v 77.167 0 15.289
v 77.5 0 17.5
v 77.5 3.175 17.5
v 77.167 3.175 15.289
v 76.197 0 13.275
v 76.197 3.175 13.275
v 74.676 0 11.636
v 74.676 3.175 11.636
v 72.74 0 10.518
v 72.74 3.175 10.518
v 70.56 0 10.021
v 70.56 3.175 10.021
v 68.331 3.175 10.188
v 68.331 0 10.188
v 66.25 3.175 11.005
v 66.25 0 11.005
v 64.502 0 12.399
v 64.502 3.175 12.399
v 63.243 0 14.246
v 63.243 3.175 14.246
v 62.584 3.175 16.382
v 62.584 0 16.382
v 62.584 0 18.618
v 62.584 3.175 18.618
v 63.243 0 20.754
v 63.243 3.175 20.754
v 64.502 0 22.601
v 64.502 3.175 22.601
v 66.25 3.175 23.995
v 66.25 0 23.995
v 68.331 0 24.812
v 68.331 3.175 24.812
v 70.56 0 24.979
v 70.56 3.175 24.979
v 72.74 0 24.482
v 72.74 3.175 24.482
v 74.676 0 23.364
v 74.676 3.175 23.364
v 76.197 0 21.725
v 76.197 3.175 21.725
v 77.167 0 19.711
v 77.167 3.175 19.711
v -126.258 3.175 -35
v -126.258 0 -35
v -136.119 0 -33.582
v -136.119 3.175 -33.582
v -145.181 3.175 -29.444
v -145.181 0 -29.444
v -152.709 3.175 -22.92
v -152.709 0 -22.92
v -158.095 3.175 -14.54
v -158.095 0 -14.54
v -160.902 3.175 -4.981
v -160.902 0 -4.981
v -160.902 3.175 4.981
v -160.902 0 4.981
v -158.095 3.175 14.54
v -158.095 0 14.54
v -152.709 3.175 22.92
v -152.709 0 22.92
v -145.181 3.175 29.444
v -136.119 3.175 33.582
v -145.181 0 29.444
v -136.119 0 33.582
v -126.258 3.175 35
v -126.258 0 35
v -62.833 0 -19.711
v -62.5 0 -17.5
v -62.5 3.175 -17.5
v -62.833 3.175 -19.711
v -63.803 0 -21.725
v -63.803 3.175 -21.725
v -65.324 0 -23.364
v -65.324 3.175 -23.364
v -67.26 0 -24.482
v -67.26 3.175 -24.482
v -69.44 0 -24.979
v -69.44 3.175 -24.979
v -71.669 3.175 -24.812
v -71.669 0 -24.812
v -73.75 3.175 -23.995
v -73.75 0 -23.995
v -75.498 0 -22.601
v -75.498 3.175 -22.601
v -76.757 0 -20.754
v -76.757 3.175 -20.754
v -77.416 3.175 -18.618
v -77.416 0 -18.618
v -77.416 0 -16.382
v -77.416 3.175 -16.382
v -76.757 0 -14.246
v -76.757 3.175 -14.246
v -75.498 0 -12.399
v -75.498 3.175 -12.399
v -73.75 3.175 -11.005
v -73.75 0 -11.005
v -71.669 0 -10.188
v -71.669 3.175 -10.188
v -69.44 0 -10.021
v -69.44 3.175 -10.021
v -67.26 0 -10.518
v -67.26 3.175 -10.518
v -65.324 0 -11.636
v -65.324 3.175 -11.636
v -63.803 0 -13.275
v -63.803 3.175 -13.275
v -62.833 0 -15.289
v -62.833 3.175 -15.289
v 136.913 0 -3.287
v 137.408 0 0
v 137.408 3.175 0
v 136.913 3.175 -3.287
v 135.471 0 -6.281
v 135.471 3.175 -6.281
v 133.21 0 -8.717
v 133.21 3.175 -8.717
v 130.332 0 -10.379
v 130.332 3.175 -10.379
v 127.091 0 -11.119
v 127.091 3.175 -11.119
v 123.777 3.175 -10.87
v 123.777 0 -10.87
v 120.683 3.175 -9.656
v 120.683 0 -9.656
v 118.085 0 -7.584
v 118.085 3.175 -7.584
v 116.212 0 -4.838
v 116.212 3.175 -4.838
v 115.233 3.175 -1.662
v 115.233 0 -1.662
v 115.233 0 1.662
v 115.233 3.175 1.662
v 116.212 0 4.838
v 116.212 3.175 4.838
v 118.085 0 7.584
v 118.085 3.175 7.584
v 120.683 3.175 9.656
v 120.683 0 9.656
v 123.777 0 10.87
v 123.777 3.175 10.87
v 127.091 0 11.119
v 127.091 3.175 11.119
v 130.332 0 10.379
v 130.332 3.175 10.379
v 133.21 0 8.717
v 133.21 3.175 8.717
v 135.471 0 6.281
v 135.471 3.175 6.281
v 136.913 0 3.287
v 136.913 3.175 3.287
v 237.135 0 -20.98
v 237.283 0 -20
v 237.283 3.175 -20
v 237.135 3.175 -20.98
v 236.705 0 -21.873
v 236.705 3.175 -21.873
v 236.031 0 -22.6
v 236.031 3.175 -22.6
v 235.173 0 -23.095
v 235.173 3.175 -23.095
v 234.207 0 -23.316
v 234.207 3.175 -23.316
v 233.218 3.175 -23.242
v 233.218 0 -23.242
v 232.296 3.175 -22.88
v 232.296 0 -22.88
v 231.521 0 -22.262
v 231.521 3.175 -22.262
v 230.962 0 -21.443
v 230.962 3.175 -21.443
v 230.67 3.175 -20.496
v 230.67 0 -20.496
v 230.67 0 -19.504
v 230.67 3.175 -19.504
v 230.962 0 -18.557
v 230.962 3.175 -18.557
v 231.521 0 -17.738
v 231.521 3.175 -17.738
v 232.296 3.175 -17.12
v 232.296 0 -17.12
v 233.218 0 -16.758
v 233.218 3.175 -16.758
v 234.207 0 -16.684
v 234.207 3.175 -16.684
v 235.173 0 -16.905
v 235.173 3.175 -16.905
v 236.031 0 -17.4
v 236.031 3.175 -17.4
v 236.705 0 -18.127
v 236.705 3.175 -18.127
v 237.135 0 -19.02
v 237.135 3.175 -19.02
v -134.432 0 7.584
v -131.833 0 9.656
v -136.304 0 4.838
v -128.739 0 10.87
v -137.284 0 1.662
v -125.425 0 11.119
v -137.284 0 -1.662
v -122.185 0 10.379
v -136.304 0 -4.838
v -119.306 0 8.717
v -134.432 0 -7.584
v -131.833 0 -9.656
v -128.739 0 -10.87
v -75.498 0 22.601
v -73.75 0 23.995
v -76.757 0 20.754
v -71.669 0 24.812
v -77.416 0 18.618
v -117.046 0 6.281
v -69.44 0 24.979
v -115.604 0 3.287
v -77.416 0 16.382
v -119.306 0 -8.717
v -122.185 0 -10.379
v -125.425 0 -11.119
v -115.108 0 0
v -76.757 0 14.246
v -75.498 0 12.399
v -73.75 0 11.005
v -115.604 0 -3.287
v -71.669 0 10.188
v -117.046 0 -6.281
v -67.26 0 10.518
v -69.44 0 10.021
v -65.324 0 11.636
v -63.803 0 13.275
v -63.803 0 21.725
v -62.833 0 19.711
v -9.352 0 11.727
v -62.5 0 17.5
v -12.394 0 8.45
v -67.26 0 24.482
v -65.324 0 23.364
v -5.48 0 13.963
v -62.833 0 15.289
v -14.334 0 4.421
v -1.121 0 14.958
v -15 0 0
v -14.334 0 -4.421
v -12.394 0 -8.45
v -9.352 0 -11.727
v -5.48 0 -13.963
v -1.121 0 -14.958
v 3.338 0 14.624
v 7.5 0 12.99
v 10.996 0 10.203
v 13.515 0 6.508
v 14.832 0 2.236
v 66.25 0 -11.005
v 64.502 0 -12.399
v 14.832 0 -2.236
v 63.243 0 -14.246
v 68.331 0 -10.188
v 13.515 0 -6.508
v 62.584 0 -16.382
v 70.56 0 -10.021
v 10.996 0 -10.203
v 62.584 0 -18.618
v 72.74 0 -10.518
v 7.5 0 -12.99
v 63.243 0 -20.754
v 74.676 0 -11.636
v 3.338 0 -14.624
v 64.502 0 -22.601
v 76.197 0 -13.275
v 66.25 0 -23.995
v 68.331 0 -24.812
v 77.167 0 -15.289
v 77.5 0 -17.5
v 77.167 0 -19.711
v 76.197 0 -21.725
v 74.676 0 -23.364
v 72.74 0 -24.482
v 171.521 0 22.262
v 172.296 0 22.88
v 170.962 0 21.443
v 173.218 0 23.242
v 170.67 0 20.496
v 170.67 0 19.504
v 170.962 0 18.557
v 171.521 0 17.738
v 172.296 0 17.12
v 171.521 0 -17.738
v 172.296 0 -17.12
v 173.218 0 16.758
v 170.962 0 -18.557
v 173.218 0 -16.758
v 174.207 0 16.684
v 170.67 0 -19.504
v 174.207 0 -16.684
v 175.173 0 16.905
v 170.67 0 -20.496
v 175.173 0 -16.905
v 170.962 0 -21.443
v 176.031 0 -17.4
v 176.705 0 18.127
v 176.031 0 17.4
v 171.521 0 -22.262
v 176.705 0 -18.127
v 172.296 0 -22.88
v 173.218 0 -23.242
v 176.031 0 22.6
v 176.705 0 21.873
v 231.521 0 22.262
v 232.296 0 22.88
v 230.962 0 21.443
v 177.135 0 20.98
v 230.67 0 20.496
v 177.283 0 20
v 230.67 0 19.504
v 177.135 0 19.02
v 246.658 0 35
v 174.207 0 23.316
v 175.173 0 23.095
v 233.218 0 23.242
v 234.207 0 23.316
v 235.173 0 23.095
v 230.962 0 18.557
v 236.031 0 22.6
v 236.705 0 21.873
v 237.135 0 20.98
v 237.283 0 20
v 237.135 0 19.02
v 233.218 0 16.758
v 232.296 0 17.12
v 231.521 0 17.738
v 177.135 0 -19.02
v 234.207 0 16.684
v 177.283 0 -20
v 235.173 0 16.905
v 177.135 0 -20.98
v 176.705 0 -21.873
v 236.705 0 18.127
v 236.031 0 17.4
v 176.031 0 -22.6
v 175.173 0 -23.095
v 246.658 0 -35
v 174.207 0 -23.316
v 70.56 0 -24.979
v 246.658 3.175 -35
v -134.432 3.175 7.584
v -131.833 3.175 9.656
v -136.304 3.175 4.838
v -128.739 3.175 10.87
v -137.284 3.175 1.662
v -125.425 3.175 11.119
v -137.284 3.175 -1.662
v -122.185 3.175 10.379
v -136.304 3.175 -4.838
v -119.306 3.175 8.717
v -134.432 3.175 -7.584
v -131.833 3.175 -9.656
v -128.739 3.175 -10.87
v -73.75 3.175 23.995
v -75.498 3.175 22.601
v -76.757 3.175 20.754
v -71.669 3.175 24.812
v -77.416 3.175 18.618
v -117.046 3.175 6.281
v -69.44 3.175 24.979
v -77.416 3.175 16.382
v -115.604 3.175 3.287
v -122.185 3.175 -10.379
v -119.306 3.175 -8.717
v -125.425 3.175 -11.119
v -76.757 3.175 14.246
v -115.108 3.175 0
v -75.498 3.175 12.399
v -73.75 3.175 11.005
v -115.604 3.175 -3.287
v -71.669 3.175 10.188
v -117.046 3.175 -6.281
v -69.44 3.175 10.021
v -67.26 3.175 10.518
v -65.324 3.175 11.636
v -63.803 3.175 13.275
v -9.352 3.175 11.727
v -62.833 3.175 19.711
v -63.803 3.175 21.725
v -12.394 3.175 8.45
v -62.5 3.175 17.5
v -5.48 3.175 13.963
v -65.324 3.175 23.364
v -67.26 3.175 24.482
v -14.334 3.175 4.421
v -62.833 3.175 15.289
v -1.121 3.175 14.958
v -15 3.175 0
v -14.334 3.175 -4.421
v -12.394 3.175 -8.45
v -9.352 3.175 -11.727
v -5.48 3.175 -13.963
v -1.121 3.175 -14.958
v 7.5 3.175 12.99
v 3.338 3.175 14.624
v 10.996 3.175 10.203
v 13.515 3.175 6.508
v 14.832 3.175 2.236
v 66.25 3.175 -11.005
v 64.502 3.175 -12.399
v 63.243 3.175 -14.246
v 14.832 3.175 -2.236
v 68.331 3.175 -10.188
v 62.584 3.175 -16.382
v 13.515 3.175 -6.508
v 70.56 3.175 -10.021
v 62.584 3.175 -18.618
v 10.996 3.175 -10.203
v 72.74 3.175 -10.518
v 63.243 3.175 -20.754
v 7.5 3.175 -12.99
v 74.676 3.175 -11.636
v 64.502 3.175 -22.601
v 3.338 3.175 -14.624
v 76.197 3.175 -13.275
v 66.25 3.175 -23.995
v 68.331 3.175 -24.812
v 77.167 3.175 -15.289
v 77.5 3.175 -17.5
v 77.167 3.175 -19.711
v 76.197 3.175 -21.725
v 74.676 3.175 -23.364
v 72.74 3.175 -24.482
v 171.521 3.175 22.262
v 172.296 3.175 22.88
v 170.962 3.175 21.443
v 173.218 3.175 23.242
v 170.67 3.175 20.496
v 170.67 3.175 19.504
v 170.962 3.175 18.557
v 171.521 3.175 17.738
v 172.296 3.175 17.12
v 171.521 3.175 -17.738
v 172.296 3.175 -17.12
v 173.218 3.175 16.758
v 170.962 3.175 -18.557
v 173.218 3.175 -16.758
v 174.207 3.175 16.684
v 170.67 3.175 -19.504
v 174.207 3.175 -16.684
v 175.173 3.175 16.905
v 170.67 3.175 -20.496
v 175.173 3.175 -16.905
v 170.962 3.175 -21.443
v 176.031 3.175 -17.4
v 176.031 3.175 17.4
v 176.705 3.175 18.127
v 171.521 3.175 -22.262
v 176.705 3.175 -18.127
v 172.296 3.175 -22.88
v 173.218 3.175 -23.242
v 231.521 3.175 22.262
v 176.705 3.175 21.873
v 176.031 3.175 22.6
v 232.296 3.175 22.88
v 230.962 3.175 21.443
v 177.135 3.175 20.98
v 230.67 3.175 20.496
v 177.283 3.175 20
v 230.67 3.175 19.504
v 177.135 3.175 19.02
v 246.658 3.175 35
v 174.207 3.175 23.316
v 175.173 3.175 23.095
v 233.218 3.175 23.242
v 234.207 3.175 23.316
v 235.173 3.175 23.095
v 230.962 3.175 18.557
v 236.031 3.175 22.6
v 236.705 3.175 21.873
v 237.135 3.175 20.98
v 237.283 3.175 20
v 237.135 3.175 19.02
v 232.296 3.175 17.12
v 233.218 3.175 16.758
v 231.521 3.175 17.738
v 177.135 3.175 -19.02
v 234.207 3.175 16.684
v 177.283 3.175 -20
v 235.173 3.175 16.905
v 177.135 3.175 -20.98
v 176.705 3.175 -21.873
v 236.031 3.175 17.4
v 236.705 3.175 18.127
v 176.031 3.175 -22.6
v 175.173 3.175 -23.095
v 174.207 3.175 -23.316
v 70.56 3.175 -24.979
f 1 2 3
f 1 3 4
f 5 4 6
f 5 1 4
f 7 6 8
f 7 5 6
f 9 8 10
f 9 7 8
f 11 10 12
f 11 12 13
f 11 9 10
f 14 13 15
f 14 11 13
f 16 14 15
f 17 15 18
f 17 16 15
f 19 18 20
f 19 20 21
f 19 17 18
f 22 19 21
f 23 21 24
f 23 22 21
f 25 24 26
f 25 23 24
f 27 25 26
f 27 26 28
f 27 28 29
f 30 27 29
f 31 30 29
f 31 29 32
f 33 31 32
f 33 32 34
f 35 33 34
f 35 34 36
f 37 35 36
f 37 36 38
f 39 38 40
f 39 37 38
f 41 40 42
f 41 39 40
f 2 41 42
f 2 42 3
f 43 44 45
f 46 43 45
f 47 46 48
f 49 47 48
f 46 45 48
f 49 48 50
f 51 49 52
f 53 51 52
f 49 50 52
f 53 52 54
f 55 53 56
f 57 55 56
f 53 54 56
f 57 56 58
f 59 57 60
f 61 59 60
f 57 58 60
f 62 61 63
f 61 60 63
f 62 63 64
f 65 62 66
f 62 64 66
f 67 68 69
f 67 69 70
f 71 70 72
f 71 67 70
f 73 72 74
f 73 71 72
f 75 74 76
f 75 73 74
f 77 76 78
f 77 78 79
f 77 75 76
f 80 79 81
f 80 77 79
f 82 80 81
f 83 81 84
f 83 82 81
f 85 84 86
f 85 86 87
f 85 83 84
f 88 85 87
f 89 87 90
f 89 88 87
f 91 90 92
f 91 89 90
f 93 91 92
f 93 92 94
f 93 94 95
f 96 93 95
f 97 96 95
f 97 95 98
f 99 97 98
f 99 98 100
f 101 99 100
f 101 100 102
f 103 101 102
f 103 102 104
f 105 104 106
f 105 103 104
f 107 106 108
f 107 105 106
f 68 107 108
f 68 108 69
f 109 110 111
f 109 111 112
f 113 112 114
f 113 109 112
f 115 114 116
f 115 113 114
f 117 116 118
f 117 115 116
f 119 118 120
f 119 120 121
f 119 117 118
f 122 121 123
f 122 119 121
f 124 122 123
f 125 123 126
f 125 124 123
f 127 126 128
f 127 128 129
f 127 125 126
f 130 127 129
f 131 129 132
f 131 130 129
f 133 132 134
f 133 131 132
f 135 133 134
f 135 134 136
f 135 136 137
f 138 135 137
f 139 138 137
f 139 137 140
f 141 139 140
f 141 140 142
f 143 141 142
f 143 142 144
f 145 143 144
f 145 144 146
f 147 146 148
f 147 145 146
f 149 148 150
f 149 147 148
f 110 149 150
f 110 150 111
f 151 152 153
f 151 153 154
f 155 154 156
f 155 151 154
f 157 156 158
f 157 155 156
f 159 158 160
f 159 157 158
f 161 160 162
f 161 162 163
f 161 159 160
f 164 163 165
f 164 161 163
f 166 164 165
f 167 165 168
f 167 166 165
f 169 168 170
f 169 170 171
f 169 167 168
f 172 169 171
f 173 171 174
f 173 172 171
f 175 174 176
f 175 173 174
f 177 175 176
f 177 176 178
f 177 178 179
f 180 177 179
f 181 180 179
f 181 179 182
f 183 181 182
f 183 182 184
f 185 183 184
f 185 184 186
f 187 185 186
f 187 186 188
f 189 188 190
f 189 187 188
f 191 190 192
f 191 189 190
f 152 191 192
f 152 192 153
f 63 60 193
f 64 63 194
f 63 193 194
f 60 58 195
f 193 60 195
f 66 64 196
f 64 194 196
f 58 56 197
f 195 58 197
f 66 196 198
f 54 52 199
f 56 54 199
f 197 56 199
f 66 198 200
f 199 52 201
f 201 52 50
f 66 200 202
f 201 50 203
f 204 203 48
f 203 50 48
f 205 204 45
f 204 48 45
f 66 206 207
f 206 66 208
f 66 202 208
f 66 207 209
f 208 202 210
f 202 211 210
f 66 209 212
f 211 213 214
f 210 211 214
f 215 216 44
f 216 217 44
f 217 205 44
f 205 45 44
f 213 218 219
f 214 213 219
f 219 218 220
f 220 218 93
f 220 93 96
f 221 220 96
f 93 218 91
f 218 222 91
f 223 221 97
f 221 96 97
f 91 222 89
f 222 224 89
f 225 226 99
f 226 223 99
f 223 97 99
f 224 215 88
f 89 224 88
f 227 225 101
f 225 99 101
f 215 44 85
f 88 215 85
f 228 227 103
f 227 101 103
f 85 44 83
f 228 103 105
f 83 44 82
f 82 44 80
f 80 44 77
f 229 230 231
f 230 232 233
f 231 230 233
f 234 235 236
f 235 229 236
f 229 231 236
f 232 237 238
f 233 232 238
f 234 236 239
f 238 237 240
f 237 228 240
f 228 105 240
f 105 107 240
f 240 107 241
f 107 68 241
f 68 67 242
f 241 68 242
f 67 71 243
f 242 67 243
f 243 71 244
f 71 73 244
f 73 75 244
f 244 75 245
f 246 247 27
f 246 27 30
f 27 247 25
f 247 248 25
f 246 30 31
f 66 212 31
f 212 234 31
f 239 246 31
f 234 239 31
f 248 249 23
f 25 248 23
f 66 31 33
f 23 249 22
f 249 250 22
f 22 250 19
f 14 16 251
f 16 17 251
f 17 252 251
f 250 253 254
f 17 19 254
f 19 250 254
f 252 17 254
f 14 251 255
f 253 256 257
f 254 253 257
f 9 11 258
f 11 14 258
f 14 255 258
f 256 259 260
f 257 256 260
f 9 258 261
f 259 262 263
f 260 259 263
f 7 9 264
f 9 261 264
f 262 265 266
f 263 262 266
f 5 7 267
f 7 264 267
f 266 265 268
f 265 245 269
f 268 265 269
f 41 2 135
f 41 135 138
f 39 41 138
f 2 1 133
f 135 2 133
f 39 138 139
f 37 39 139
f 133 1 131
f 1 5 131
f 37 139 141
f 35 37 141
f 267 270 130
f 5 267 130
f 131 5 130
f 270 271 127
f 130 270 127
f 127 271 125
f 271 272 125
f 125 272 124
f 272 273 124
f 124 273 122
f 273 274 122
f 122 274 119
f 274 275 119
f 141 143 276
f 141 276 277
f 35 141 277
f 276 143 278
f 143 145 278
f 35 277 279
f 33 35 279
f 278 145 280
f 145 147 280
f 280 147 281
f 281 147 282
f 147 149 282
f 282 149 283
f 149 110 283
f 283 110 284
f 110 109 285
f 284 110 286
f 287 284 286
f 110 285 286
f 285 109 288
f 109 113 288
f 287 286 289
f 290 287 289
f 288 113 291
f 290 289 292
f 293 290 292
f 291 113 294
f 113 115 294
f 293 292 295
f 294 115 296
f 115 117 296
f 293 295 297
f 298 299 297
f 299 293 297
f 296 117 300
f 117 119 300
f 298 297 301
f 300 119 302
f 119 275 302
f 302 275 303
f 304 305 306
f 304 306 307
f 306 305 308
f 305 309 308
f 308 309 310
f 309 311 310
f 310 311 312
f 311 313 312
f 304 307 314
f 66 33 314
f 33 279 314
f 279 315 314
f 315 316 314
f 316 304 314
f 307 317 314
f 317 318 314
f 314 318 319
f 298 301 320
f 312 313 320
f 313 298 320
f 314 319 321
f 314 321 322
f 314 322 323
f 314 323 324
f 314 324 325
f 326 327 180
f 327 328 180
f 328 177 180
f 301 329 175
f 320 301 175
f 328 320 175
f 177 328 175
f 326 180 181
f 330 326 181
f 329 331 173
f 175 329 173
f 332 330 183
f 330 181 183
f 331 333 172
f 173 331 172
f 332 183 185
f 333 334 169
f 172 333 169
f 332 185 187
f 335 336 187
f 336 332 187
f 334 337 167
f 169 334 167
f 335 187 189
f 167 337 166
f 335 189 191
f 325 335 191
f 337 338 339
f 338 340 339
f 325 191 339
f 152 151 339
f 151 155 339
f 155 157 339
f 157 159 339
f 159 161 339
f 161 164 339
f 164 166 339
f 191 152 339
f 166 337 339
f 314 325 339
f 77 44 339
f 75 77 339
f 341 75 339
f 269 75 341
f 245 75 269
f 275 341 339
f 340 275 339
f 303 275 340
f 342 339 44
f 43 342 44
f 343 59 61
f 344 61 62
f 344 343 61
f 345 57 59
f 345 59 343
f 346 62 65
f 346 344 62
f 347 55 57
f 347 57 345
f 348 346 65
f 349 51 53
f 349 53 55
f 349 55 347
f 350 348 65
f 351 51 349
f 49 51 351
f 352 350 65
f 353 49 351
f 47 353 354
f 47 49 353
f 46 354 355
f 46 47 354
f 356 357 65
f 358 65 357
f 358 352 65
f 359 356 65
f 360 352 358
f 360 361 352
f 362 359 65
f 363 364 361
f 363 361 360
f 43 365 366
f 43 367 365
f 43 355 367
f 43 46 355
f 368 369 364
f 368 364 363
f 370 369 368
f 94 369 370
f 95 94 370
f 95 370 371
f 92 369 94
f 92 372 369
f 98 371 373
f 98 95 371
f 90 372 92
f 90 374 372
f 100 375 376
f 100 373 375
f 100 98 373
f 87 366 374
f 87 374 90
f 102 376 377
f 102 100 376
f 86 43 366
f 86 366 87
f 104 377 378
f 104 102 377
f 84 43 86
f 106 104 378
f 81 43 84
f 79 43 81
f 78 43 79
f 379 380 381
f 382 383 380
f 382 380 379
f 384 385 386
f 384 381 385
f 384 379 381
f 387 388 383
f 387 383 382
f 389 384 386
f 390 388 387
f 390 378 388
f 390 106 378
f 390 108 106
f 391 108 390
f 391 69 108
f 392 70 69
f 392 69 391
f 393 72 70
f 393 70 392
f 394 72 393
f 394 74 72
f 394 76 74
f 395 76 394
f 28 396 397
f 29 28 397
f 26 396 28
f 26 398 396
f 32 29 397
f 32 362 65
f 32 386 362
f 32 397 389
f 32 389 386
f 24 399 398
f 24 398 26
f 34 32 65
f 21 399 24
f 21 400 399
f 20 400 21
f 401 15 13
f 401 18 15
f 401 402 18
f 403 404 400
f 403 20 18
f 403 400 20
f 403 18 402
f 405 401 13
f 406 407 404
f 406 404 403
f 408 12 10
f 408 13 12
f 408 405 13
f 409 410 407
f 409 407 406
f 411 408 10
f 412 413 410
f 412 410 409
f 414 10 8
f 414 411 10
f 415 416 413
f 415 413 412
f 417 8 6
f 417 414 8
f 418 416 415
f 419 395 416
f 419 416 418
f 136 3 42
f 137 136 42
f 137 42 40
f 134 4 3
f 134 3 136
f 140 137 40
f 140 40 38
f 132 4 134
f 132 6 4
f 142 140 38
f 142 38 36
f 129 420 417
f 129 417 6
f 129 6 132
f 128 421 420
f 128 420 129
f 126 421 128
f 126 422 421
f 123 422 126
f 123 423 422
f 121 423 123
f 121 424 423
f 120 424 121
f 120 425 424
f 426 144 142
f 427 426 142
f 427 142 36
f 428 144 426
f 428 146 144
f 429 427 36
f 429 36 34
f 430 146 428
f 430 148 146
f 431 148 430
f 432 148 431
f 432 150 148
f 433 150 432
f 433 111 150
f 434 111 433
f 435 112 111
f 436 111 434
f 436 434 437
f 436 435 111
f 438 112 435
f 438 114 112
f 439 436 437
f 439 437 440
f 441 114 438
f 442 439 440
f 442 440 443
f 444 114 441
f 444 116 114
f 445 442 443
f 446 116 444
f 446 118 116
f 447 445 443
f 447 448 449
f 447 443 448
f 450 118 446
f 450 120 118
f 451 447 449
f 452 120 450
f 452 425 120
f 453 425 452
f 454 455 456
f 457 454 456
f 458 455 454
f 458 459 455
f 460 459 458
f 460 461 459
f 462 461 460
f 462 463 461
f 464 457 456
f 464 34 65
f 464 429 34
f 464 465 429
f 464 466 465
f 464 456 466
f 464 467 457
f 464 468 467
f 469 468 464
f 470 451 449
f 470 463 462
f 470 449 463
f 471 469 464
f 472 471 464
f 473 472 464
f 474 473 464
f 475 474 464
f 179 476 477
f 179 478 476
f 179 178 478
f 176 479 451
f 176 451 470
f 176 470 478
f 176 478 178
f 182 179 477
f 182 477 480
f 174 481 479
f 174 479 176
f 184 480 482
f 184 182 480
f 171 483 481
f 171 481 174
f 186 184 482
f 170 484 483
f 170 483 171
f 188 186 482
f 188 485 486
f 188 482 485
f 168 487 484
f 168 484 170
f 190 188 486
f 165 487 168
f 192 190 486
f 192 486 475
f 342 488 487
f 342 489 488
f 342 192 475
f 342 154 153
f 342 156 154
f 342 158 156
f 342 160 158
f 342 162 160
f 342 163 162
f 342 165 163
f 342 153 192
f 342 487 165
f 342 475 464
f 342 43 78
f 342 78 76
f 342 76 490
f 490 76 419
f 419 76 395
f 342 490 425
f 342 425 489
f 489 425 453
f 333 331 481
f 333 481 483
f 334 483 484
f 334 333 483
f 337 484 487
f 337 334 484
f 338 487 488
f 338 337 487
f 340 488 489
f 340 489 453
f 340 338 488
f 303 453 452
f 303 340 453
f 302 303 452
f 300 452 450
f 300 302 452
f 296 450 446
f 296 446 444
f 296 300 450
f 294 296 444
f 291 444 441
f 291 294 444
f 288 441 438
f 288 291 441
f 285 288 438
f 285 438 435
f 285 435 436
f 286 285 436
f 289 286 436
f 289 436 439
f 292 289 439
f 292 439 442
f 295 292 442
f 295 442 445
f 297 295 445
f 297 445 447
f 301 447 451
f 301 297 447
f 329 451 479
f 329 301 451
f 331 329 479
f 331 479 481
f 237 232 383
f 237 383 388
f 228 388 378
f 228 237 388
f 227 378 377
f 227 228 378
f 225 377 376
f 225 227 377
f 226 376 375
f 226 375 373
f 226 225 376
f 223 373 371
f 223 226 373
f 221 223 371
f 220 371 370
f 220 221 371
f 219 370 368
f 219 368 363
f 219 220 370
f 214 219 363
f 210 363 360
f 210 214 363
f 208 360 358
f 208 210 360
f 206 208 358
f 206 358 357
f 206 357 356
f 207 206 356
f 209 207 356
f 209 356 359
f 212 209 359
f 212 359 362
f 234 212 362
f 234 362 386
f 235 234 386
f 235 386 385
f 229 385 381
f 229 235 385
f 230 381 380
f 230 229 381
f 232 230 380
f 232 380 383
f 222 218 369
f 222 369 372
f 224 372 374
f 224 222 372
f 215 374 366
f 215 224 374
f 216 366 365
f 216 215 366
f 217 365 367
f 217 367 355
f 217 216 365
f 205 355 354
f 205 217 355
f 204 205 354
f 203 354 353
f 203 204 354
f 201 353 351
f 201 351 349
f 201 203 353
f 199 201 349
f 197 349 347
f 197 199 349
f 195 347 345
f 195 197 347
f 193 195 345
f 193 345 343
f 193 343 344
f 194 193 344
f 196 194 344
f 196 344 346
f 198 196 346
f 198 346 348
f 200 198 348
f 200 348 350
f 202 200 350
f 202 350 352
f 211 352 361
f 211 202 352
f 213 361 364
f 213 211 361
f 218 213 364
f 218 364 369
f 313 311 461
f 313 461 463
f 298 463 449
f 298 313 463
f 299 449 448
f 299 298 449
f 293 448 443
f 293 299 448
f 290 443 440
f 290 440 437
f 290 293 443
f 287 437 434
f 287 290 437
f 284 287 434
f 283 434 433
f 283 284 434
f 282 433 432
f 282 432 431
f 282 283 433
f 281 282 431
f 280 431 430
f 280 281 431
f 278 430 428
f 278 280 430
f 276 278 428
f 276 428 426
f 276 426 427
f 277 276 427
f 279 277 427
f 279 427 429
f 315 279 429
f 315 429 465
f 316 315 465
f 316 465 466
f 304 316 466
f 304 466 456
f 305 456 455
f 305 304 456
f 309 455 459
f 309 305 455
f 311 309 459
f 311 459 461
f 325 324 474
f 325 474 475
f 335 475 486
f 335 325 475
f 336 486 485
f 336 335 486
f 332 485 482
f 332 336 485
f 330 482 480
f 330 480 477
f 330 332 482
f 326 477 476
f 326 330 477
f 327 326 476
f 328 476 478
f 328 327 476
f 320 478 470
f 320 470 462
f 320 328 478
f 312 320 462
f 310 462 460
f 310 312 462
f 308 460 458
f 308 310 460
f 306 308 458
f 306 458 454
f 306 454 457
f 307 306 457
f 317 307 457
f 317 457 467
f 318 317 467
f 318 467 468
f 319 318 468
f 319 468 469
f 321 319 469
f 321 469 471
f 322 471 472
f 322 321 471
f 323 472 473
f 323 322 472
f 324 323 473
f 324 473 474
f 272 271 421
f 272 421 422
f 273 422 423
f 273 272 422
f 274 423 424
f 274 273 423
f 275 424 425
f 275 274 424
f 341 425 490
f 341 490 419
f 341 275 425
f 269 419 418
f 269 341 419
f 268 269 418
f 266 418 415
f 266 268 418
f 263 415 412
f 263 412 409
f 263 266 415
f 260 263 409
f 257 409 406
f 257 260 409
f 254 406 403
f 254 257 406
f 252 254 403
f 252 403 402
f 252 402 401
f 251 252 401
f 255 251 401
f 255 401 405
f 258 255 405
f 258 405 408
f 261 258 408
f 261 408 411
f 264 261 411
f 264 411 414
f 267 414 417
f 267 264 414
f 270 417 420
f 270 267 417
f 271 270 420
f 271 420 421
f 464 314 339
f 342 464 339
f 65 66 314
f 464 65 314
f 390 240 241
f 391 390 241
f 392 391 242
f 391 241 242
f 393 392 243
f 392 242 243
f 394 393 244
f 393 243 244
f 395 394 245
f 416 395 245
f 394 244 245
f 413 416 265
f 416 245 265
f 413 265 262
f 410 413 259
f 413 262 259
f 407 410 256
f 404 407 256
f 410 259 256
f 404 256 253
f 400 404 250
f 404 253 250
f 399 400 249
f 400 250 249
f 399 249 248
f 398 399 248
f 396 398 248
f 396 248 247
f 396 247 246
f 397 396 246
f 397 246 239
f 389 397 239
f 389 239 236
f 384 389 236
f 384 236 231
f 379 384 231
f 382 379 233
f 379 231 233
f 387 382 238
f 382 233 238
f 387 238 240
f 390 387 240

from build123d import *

# Parameters (mm, degrees)
SKETCH1_R           = 11.15
SKETCH1_R_2         = 7.5
SKETCH1_R_3         = 3.325
BOSS_EXTRUDE1_DEPTH = 3.175


with BuildPart() as part:
    # Sketch1 → Boss-Extrude1 (new body)
    with BuildSketch(Plane(origin=(0, 0, 0), x_dir=(1, 0, 0), z_dir=(0, 1, 0))):
        with BuildLine():
            ThreePointArc((-126.258214395, 35), (-161.258214395, 0), (-126.258214395, -35))
            Line((-126.258214395, -35), (246.658214395, -35))
            Line((246.658214395, -35), (246.658214395, 35))
            Line((246.658214395, 35), (-126.258214395, 35))
        make_face()
        with Locations((-126.258214395, 0)):
            Circle(SKETCH1_R, mode=Mode.SUBTRACT)
        with Locations((-70, -17.5)):
            Circle(SKETCH1_R_2, mode=Mode.SUBTRACT)
        with BuildLine():
            ThreePointArc((15, 0), (0, -15), (-15, 0))
            ThreePointArc((-15, 0), (0, 15), (15, 0))
        make_face(mode=Mode.SUBTRACT)
        with Locations((70, -17.5)):
            Circle(SKETCH1_R_2, mode=Mode.SUBTRACT)
        with Locations((173.958214395, -20)):
            Circle(SKETCH1_R_3, mode=Mode.SUBTRACT)
        with Locations((233.958214395, -20)):
            Circle(SKETCH1_R_3, mode=Mode.SUBTRACT)
        with Locations((-70, 17.5)):
            Circle(SKETCH1_R_2, mode=Mode.SUBTRACT)
        with Locations((126.258214395, 0)):
            Circle(SKETCH1_R, mode=Mode.SUBTRACT)
        with Locations((70, 17.5)):
            Circle(SKETCH1_R_2, mode=Mode.SUBTRACT)
        with Locations((173.958214395, 20)):
            Circle(SKETCH1_R_3, mode=Mode.SUBTRACT)
        with Locations((233.958214395, 20)):
            Circle(SKETCH1_R_3, mode=Mode.SUBTRACT)
    extrude(amount=BOSS_EXTRUDE1_DEPTH)


solid = part.part
